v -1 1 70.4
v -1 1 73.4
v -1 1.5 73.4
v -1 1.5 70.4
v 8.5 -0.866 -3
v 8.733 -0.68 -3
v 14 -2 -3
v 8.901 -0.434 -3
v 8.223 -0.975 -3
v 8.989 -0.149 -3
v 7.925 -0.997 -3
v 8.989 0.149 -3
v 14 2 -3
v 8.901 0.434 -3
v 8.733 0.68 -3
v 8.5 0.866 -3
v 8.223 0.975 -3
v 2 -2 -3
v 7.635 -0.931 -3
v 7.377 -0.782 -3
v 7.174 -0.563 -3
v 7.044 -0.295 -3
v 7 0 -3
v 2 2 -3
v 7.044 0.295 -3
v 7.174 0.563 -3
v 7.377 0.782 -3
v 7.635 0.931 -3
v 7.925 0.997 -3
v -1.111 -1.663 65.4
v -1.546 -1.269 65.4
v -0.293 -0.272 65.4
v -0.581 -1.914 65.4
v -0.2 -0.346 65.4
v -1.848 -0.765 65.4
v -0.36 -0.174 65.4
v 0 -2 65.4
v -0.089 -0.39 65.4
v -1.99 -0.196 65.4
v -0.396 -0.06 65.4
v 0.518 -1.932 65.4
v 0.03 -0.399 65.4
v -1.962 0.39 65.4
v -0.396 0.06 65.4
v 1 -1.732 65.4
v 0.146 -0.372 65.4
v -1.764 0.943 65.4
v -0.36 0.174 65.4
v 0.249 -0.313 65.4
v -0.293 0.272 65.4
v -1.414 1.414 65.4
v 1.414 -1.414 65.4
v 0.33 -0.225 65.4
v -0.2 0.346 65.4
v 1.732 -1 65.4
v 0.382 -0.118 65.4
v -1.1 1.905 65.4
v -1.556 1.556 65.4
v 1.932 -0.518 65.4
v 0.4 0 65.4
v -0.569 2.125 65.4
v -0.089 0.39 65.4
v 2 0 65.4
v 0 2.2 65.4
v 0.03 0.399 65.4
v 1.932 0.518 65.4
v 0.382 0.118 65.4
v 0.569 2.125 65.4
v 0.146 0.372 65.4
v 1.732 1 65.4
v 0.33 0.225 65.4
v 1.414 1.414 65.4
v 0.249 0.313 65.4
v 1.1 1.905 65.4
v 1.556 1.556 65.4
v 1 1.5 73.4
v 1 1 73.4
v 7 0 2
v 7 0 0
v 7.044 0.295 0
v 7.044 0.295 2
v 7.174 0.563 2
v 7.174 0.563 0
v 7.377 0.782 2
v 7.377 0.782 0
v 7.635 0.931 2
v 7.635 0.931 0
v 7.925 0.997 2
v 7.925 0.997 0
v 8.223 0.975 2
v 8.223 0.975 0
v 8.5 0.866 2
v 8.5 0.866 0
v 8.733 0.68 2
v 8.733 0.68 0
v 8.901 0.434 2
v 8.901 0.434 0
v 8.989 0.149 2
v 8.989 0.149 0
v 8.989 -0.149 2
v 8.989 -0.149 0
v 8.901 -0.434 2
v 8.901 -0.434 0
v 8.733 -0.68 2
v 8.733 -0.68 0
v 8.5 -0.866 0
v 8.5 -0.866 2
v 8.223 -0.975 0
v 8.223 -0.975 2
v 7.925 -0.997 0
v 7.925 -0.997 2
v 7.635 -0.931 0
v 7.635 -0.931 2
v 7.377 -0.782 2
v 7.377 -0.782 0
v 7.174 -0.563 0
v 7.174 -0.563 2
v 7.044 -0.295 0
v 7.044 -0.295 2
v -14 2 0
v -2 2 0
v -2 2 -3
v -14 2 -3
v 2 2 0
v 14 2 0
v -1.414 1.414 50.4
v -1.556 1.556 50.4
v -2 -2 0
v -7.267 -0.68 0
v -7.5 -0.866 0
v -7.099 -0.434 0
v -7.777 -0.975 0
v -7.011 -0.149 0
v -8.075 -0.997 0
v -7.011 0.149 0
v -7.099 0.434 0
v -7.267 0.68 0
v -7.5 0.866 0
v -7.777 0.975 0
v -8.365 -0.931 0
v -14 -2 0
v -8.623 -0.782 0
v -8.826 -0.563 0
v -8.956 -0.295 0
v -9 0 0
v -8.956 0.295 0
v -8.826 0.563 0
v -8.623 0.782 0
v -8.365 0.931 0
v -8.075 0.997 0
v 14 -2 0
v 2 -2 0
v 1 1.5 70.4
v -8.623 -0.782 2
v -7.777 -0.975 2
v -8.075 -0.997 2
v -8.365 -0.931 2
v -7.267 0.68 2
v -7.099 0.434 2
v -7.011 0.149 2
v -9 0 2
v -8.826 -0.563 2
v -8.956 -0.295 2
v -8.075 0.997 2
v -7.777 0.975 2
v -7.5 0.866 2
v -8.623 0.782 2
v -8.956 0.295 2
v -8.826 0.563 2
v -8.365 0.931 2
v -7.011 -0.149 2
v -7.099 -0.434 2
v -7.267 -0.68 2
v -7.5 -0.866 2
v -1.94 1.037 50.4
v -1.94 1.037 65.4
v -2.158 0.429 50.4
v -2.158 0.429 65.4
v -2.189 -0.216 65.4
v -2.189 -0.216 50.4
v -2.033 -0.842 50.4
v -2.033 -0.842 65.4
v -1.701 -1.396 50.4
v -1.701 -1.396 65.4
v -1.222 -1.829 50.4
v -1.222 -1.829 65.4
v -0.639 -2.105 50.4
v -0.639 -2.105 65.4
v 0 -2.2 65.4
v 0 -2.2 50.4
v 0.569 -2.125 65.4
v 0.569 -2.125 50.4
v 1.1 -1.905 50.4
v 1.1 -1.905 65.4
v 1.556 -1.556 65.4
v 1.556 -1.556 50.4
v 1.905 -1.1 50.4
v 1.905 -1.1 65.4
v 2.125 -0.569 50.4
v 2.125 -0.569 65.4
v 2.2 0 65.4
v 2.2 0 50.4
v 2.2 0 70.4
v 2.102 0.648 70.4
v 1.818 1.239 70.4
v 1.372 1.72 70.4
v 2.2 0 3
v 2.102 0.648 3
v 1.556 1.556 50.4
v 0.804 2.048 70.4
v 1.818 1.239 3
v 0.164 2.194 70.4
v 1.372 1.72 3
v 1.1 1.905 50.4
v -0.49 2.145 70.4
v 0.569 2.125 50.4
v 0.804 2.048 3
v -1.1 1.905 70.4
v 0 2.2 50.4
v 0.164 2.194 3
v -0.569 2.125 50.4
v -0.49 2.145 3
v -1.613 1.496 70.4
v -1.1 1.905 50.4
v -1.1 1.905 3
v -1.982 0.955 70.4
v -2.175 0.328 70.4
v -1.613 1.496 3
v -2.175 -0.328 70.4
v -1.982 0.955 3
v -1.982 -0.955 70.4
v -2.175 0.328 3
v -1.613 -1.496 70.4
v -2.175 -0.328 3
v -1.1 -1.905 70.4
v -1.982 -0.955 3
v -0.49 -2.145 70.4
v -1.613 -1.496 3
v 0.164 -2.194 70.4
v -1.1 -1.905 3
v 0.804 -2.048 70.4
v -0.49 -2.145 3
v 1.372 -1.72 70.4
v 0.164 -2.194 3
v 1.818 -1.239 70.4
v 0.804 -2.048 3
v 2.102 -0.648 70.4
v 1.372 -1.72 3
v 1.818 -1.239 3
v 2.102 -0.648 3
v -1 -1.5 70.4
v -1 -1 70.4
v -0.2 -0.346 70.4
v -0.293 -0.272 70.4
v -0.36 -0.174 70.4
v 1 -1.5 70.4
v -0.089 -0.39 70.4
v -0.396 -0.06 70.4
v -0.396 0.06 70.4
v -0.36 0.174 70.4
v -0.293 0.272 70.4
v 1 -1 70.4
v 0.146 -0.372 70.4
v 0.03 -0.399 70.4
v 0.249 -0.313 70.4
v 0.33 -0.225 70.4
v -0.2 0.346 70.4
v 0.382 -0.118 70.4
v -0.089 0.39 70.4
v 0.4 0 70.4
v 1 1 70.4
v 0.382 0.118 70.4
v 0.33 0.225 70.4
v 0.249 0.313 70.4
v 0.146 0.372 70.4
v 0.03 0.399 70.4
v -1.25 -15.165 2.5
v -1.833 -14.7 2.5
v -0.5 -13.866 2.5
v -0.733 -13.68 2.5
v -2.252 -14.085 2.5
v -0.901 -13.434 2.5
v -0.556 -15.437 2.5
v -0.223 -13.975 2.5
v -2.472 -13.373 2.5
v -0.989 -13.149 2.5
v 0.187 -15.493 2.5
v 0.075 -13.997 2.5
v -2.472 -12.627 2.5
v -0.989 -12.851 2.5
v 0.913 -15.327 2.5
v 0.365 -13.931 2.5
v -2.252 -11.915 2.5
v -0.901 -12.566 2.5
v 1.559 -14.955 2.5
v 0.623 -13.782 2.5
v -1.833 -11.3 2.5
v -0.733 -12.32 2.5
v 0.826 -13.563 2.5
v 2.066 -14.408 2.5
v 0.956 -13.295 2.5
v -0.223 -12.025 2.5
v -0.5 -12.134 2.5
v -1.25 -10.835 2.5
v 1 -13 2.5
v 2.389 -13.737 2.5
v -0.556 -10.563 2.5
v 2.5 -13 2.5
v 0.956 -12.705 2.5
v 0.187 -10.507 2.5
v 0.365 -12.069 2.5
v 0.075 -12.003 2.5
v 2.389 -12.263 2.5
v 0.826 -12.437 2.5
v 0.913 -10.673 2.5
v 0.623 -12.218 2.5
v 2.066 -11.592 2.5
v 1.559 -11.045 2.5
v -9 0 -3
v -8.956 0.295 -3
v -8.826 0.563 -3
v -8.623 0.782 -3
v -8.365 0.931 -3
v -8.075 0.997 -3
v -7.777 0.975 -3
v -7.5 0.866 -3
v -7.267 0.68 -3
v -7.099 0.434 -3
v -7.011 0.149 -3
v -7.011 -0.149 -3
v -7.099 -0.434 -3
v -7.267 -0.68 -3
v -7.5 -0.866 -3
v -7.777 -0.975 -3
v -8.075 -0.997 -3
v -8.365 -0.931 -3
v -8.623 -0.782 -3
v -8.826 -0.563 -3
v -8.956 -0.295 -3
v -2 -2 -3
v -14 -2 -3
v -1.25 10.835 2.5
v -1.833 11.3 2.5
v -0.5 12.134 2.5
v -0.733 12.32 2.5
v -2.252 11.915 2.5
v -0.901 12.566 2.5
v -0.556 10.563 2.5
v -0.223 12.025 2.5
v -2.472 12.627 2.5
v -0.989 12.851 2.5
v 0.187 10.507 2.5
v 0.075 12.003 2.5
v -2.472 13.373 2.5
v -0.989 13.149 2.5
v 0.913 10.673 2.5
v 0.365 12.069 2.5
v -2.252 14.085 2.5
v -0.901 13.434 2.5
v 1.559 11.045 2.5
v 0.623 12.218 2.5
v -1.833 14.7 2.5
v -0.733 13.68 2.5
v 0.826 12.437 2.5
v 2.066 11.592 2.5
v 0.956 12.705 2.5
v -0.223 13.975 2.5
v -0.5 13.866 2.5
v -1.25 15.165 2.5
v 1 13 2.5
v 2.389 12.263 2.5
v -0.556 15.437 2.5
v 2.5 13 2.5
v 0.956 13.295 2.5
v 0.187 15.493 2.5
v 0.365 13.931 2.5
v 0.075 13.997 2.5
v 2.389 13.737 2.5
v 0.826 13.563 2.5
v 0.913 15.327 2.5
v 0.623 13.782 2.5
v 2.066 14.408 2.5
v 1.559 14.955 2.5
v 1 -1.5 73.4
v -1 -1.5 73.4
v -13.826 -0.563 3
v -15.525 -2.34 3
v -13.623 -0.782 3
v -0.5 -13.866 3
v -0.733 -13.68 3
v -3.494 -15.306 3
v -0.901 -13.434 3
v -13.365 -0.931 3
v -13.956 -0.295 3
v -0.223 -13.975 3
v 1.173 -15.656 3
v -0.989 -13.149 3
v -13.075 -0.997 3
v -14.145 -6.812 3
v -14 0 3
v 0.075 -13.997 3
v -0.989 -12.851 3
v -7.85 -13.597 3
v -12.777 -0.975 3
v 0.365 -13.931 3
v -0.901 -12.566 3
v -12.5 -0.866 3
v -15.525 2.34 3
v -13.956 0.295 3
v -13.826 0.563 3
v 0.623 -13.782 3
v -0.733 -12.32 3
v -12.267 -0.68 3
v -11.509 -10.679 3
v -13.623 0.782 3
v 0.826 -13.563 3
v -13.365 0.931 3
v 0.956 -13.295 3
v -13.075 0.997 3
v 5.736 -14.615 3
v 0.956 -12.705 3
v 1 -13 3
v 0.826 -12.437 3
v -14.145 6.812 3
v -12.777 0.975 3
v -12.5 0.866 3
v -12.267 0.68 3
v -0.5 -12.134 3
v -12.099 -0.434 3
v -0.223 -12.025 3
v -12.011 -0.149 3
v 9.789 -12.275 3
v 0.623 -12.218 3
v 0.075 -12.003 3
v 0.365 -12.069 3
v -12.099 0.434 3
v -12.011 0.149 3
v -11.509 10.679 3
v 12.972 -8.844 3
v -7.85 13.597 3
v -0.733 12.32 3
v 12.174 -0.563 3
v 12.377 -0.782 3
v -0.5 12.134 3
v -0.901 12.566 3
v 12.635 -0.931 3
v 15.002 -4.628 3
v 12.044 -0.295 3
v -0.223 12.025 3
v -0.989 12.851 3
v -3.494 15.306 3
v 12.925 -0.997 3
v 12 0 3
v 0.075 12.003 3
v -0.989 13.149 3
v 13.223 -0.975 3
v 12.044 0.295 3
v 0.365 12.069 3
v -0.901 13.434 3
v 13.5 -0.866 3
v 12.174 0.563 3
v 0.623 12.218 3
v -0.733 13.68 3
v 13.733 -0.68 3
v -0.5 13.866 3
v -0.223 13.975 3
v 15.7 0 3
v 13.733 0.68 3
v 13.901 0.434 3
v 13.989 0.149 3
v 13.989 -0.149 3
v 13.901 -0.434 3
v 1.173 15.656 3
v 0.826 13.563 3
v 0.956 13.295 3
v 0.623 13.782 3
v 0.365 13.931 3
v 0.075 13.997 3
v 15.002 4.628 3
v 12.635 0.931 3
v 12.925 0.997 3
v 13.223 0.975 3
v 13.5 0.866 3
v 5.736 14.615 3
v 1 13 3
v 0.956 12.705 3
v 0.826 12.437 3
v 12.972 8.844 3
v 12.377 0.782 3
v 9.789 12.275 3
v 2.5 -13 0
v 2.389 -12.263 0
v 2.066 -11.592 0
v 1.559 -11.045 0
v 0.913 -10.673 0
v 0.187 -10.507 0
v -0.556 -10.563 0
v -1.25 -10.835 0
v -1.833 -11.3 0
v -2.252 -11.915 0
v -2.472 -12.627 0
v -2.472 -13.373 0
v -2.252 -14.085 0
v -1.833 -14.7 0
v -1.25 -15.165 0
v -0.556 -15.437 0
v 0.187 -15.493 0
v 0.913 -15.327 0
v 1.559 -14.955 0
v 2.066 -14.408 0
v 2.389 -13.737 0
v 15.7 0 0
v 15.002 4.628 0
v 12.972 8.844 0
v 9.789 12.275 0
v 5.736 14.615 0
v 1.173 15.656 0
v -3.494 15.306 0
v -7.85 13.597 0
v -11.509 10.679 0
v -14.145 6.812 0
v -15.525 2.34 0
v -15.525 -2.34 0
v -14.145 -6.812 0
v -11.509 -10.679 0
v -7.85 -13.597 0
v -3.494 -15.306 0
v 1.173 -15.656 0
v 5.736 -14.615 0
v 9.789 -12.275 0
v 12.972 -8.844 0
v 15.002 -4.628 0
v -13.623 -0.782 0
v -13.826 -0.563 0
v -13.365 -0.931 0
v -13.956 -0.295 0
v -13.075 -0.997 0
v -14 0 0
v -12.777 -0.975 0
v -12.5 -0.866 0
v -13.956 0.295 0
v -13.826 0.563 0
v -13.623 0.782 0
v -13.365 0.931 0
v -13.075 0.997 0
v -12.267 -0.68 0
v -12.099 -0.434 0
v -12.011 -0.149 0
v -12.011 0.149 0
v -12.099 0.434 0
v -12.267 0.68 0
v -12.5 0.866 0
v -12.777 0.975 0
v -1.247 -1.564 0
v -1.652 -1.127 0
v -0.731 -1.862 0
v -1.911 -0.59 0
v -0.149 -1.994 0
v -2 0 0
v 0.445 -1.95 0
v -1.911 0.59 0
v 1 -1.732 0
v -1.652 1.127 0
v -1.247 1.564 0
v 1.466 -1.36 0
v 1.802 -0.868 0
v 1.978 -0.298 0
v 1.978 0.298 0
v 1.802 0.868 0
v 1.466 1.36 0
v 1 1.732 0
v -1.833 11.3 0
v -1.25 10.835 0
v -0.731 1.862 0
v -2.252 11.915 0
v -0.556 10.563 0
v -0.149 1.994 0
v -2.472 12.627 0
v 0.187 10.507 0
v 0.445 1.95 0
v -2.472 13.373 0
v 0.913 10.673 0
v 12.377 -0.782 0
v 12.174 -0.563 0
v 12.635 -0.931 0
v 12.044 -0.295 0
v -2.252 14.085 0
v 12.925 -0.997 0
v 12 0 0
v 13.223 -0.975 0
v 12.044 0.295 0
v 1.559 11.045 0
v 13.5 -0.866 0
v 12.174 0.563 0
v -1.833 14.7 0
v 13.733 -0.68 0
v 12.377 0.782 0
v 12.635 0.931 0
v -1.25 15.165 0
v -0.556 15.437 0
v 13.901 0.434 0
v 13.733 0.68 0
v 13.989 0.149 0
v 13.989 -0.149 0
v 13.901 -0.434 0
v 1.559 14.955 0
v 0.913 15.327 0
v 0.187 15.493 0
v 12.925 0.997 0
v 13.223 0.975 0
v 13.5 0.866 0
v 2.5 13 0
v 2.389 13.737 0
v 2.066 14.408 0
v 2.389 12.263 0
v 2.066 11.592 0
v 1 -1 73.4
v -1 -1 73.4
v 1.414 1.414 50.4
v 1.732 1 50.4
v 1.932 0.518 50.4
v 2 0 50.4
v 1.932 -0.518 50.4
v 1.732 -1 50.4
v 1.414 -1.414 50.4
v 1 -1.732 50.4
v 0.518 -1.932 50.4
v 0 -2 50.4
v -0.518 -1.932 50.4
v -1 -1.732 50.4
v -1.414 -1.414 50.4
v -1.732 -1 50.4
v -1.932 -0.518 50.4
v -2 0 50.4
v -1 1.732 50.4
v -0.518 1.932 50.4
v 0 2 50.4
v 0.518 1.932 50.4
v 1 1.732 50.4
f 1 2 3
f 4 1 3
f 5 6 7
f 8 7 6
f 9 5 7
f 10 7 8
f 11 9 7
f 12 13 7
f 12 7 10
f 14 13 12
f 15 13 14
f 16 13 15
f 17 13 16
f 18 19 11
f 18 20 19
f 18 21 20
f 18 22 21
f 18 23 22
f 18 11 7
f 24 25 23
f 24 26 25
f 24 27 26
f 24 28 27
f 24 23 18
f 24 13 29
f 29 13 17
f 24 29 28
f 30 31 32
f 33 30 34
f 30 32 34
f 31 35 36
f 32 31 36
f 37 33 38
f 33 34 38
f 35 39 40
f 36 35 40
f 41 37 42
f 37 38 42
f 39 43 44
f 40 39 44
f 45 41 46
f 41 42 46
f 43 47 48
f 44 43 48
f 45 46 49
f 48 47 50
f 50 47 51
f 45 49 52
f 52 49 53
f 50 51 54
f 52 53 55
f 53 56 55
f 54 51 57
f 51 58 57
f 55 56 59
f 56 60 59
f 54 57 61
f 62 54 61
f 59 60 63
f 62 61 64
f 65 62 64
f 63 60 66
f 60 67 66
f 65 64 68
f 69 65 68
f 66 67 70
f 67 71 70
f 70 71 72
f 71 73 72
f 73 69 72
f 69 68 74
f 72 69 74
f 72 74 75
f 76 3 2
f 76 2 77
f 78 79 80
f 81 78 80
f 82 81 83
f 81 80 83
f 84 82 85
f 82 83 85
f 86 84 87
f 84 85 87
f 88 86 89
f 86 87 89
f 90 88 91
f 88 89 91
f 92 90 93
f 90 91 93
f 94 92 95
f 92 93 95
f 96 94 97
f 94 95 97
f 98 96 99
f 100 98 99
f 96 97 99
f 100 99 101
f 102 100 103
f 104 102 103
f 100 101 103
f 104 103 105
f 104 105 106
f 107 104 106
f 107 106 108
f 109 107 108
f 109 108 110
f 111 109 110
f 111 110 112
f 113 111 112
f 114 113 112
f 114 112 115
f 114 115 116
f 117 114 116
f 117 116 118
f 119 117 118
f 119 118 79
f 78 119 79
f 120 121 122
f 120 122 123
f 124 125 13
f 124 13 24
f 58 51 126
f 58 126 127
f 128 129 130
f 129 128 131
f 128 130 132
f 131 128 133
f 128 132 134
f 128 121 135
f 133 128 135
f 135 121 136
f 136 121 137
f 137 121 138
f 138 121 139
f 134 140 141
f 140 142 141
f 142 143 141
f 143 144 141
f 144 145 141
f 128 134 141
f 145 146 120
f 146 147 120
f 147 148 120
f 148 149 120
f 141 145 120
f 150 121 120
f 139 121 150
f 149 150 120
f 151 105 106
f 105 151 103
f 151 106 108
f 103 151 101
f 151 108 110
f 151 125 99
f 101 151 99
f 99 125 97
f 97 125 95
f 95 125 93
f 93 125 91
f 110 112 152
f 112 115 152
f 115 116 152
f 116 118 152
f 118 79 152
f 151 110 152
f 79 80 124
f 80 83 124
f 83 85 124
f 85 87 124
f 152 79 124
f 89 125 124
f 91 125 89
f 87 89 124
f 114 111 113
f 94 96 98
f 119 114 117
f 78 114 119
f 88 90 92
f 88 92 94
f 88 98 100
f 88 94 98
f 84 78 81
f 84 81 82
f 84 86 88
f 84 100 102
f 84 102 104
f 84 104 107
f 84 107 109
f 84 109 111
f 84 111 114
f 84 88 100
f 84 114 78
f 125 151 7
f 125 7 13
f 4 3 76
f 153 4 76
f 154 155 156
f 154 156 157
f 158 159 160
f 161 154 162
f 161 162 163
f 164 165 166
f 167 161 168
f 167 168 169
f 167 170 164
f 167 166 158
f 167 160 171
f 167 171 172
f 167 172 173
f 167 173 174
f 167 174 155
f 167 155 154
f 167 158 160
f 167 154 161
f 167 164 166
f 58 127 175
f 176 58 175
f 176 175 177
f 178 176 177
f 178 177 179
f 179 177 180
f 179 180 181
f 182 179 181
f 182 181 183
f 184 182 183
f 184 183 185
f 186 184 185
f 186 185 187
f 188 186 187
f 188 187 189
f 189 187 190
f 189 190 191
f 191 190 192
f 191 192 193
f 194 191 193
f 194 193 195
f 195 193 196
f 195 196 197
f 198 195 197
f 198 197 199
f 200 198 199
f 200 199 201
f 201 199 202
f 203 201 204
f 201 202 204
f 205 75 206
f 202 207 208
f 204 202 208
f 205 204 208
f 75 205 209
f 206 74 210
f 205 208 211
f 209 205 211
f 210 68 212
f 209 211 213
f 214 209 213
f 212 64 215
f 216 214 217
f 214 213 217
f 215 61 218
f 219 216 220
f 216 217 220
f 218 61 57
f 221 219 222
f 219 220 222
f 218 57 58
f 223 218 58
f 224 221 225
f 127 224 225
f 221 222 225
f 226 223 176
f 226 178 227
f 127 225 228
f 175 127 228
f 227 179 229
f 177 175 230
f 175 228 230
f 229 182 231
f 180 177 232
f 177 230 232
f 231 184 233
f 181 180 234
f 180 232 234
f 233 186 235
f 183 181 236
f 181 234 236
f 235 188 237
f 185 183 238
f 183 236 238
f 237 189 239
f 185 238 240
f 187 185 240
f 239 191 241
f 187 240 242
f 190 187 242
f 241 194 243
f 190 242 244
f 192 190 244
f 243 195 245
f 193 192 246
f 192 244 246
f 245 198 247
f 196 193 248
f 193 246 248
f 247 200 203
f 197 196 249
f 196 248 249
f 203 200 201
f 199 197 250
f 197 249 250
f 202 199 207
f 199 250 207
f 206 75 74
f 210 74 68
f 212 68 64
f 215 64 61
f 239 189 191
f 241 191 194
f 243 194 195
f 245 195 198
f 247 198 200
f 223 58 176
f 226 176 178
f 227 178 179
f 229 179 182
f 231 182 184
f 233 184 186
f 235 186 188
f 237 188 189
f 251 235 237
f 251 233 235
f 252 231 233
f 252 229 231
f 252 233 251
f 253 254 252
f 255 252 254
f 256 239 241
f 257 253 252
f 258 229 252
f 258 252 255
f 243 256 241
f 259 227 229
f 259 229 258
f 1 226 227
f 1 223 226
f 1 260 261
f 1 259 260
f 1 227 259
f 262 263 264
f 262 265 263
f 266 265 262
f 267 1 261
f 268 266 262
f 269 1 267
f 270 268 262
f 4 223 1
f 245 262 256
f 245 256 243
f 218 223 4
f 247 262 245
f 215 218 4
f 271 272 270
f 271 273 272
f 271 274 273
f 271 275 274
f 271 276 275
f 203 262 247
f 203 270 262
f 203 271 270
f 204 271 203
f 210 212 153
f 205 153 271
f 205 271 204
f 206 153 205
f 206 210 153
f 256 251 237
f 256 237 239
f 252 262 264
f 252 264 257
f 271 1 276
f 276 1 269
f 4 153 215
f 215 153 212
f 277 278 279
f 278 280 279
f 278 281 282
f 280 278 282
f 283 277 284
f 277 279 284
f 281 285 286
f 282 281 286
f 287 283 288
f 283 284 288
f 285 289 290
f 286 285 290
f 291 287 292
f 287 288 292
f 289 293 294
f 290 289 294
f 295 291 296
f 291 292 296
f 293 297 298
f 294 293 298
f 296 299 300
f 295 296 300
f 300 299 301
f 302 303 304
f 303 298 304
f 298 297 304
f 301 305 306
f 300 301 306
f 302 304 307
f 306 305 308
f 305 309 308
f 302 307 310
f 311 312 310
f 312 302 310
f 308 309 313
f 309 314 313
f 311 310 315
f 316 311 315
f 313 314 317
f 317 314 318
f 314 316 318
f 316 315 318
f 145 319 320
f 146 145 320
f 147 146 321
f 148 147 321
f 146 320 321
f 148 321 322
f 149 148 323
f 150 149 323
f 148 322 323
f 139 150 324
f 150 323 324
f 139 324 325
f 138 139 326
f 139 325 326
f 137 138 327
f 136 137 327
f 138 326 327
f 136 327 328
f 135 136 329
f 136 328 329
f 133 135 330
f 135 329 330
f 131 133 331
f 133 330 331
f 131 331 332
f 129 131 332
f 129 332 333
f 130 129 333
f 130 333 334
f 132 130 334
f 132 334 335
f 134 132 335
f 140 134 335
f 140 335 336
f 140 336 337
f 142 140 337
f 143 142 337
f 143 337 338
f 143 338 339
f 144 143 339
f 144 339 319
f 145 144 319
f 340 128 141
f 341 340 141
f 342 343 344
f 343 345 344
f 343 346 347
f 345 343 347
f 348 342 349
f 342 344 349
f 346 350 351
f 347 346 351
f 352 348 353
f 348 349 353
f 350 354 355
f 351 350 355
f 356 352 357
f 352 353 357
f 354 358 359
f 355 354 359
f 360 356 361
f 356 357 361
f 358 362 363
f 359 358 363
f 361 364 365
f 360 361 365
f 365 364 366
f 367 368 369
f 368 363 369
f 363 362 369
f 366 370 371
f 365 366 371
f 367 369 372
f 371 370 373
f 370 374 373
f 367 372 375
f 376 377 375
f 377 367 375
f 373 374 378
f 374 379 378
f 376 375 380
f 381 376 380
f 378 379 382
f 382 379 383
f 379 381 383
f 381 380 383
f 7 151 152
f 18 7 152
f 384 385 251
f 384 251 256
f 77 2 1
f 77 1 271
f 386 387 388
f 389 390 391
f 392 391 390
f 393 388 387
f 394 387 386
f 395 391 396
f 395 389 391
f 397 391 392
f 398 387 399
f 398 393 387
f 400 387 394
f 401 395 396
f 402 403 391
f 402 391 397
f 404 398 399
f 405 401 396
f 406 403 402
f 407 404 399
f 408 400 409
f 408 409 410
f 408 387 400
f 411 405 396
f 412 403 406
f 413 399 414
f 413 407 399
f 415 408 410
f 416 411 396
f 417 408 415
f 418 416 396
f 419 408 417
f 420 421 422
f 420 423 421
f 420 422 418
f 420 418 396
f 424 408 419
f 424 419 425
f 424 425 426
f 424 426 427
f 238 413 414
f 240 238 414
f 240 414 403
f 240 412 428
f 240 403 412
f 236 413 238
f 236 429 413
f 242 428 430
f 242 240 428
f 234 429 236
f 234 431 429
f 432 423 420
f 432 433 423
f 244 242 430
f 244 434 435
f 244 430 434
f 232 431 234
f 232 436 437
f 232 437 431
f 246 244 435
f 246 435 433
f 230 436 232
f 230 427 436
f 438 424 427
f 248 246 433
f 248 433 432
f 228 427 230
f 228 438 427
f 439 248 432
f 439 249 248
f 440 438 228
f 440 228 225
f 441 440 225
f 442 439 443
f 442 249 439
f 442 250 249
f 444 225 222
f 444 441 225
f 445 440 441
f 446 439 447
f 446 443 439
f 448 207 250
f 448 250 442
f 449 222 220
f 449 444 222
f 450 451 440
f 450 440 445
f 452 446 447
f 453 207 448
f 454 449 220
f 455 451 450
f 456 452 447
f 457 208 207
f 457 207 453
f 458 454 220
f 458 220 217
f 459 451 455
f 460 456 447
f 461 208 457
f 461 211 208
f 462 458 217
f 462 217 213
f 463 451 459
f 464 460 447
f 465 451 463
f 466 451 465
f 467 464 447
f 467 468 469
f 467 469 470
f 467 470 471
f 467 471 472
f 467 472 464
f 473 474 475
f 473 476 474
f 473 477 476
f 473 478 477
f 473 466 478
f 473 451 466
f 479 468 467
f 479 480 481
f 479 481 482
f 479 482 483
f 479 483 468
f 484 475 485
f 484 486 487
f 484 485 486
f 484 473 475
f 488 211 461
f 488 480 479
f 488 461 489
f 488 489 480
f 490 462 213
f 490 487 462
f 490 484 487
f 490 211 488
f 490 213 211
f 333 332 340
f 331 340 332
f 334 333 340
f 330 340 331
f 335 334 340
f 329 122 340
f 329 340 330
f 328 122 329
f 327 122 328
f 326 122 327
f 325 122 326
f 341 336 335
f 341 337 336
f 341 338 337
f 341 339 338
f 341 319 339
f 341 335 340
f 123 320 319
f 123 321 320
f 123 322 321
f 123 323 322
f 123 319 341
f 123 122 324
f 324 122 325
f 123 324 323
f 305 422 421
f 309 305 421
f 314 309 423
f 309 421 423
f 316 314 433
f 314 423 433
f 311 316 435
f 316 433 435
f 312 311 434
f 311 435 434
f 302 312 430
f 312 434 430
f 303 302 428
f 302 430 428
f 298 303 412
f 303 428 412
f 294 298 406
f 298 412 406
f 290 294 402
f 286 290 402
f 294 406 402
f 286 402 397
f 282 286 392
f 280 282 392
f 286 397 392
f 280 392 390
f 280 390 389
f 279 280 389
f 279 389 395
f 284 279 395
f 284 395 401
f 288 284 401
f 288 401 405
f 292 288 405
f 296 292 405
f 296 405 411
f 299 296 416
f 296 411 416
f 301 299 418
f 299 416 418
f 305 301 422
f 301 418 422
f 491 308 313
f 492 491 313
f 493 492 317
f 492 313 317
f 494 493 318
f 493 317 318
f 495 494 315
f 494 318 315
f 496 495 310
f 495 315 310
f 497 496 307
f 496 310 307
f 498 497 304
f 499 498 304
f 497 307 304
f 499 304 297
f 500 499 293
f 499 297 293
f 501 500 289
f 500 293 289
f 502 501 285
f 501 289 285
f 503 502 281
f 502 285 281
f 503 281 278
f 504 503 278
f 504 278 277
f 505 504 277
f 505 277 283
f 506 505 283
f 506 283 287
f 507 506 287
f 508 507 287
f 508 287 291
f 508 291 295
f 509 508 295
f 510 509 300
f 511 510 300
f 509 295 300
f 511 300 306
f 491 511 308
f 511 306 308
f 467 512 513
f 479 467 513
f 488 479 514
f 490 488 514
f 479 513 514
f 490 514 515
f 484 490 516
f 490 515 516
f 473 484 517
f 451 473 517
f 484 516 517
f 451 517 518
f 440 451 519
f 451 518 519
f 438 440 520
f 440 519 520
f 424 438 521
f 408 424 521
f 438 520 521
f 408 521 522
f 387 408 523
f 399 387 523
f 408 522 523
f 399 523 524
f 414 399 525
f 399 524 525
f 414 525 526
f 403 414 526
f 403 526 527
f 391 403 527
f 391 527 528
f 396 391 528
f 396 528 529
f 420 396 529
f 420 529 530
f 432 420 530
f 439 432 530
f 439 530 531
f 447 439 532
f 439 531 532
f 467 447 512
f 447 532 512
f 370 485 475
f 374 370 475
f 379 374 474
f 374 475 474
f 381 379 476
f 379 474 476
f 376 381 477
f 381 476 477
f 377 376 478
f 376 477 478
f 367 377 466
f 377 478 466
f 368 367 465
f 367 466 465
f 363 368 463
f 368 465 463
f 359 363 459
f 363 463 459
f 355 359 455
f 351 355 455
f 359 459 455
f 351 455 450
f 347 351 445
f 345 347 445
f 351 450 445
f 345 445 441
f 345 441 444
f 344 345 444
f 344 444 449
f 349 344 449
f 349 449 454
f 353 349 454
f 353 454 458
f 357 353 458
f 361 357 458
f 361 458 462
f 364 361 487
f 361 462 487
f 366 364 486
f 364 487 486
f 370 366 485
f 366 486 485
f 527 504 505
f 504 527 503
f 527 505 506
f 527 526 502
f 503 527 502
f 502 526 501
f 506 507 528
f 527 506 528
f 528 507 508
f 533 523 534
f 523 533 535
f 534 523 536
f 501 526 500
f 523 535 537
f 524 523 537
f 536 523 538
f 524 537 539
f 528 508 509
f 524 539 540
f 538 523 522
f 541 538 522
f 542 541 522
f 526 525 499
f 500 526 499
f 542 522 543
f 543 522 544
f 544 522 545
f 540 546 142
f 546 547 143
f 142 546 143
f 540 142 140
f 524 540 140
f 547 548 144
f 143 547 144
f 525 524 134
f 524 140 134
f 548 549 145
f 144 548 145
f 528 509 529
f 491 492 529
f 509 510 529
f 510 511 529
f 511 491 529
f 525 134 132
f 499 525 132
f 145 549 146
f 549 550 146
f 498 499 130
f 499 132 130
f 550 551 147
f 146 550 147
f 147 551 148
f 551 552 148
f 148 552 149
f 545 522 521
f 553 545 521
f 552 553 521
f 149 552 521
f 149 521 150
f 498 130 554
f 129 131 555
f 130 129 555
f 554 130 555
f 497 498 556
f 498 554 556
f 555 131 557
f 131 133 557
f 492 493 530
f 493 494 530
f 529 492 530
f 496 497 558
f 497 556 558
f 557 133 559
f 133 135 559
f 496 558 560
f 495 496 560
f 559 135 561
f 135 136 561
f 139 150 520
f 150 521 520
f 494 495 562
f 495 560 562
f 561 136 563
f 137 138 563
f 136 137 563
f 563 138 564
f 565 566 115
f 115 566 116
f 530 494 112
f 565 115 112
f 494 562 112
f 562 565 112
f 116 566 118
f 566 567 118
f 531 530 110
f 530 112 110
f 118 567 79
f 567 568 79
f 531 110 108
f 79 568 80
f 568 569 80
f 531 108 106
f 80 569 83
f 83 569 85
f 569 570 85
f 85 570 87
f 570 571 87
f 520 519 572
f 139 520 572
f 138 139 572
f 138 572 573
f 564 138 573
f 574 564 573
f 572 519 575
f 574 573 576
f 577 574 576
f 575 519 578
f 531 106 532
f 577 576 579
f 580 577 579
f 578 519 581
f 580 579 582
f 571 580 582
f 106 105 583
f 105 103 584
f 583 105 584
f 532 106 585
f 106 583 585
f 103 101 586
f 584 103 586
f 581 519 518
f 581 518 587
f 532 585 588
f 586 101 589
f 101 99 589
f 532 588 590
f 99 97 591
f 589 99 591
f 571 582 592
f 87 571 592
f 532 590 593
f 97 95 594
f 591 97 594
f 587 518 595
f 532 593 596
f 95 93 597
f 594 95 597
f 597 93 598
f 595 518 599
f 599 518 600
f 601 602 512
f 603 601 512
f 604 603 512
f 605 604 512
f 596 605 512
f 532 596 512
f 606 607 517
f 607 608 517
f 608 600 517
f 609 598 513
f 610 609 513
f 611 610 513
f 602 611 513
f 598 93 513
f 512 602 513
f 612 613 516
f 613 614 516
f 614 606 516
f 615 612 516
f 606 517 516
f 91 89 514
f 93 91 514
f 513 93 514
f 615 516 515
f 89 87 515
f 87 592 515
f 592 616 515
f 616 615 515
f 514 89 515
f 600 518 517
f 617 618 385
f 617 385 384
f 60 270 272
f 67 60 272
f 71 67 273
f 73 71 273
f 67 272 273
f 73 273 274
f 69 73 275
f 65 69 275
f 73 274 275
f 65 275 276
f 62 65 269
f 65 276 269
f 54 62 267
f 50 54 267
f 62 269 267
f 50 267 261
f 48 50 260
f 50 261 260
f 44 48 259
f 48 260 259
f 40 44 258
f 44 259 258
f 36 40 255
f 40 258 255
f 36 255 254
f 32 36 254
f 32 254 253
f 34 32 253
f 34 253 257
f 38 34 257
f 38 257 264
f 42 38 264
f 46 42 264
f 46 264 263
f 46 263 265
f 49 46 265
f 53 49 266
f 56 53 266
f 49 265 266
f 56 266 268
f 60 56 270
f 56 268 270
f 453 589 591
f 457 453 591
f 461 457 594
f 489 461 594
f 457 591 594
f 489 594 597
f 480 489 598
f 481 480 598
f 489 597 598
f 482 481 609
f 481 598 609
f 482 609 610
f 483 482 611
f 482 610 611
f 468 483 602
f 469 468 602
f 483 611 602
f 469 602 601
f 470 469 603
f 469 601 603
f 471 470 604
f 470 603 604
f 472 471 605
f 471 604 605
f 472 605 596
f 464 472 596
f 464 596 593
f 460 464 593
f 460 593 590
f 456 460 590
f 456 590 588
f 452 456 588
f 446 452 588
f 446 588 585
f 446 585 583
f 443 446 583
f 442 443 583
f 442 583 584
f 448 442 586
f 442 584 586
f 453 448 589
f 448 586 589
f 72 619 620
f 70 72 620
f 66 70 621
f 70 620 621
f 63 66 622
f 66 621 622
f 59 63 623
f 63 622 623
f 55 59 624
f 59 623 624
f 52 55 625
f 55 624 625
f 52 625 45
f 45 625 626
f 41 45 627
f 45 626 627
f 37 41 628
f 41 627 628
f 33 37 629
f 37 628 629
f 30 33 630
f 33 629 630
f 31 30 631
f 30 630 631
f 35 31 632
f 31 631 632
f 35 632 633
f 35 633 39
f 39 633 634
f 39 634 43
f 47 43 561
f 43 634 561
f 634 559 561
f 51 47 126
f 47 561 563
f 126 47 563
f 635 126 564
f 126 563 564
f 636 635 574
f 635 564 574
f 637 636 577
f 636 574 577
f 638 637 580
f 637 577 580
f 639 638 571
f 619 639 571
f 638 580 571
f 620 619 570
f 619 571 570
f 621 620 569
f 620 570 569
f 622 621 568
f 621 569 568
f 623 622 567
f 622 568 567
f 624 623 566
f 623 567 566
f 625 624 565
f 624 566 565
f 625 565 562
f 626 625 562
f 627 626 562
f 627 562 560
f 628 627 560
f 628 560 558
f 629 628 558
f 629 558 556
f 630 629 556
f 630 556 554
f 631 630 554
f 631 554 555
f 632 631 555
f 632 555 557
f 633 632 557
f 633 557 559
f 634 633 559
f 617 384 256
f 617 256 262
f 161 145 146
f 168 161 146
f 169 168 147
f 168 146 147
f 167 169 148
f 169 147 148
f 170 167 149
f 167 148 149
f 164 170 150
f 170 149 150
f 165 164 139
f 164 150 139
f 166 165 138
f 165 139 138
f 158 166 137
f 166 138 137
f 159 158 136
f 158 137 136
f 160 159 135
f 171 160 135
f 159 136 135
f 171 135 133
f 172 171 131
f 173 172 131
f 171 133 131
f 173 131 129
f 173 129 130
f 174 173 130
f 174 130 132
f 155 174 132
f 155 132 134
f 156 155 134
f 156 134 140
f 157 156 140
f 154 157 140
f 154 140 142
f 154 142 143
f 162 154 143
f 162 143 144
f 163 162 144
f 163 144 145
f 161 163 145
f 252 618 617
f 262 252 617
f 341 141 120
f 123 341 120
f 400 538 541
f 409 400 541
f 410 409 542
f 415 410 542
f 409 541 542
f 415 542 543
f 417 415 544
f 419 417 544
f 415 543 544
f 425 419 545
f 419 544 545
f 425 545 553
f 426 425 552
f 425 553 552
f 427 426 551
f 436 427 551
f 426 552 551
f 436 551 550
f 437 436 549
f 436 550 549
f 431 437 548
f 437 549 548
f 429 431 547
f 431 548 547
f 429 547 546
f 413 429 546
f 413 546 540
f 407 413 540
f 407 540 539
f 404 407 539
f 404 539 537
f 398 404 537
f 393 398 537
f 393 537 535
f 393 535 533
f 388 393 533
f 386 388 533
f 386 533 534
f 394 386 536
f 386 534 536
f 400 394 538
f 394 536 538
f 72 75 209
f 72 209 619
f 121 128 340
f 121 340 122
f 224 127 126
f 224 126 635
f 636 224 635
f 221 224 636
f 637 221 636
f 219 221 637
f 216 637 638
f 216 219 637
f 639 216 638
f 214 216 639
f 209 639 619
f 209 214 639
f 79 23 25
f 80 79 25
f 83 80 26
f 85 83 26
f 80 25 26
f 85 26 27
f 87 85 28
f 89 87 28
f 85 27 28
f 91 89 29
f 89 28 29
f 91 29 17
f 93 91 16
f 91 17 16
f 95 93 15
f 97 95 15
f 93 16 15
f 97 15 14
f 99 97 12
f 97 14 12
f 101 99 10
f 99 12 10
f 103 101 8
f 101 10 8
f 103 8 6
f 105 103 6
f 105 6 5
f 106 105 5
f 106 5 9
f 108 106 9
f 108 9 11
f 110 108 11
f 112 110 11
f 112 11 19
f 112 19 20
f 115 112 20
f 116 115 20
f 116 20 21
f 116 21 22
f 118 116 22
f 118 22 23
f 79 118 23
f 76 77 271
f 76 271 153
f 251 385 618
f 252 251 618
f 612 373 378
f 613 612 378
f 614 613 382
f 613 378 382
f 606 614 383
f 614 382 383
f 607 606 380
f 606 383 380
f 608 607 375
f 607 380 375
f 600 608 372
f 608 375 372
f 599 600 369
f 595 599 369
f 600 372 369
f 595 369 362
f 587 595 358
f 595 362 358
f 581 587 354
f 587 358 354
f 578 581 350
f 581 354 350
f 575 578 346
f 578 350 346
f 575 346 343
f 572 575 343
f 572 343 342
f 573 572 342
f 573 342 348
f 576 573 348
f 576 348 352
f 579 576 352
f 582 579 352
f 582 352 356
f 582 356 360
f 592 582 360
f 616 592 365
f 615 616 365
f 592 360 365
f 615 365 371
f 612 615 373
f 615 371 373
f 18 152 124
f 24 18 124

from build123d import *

# Parameters (mm, degrees)
SKETCH_1_R            = 15.7
EXTRUDE_1_DEPTH       = 3
SKETCH_5_R            = 1
CUT_EXTRUDE_3_DEPTH   = 3
SKETCH_6_R            = 1
CUT_EXTRUDE_4_DEPTH   = 3
SKETCH_7_R            = 2
CUT_EXTRUDE_5_DEPTH   = 3
SKETCH_10_W           = 12
SKETCH_10_H           = 4
EXTRUDE_8_DEPTH       = 3
SKETCH_11_W           = 12
SKETCH_11_H           = 4
EXTRUDE_9_DEPTH       = 3
SKETCH_12_R           = 2.2
EXTRUDE_11_DEPTH      = 47.4
SKETCH_16_R           = 2
CUT_EXTRUDE_6_DEPTH   = 47.4
EXTRUDE_13_DEPTH      = 15
SKETCH_20_R           = 2.2
EXTRUDE_15_DEPTH      = 8
SKETCH_22_OUTSIDE_W   = 51.074
SKETCH_22_OUTSIDE_H   = 51.074
SKETCH_22_OUTSIDE_W_2 = 2
SKETCH_22_OUTSIDE_H_2 = 0.5
CUT_EXTRUDE_7_DEPTH   = 3
SKETCH_24_R           = 0.4
CUT_EXTRUDE_9_DEPTH   = 5
SKETCH_25_R           = 1
CUT_EXTRUDE_10_DEPTH  = 0.5
SKETCH_26_R           = 2.5
CUT_EXTRUDE_12_DEPTH  = 2.5
SKETCH_27_R           = 1
CUT_EXTRUDE_13_DEPTH  = 5


with BuildPart() as part:
    # 草图1 → 凸台-拉伸1 (new body)
    with BuildSketch(Plane.XY):
        Circle(SKETCH_1_R)
    extrude(amount=EXTRUDE_1_DEPTH)

    # 草图5 → 切除-拉伸3 (cut)
    with BuildSketch(Plane(origin=(0, 0, 0), x_dir=(-1, 0, 0), z_dir=(0, 0, -1))):
        with Locations((13, 0)):
            Circle(SKETCH_5_R)
    extrude(amount=-CUT_EXTRUDE_3_DEPTH, mode=Mode.SUBTRACT)

    # 草图6 → 切除-拉伸4 (cut)
    with BuildSketch(Plane(origin=(0, 0, 0), x_dir=(-1, 0, 0), z_dir=(0, 0, -1))):
        with Locations((-13, 0)):
            Circle(SKETCH_6_R)
    extrude(amount=-CUT_EXTRUDE_4_DEPTH, mode=Mode.SUBTRACT)

    # 草图7 → 切除-拉伸5 (cut)
    with BuildSketch(Plane(origin=(0, 0, 0), x_dir=(-1, 0, 0), z_dir=(0, 0, -1))):
        Circle(SKETCH_7_R)
    extrude(amount=-CUT_EXTRUDE_5_DEPTH, mode=Mode.SUBTRACT)

    # 草图12 → 凸台-拉伸11 (add)
    with BuildSketch(Plane.XY.offset(3)):
        Circle(SKETCH_12_R)
    extrude(amount=EXTRUDE_11_DEPTH)

    # 草图16 → 切除-拉伸6 (cut)
    with BuildSketch(Plane(origin=(0, 0, 3), x_dir=(-1, 0, 0), z_dir=(0, 0, -1))):
        Circle(SKETCH_16_R)
    extrude(amount=-CUT_EXTRUDE_6_DEPTH, mode=Mode.SUBTRACT)

    # 草图19 → 凸台-拉伸13 (add)
    with BuildSketch(Plane.XY.offset(50.4)):
        with BuildLine():
            ThreePointArc((0, -2), (-1.847759065, -0.765366865), (-1.414213562, 1.414213562))
            Line((-1.414213562, 1.414213562), (-1.555634919, 1.555634919))
            ThreePointArc((-1.555634919, 1.555634919), (-2.032534972, -0.841903551), (0, -2.2))
            Line((0, -2.2), (0, -2))
        make_face()
        with BuildLine():
            Line((1.555634919, 1.555634919), (1.414213562, 1.414213562))
            ThreePointArc((1.414213562, 1.414213562), (1.847759065, 0.765366865), (2, 0))
            ThreePointArc((2, 0), (1.414213562, -1.414213562), (0, -2))
            Line((0, -2), (0, -2.2))
            ThreePointArc((0, -2.2), (1.555634919, -1.555634919), (2.2, 0))
            ThreePointArc((2.2, 0), (2.032534972, 0.841903551), (1.555634919, 1.555634919))
        make_face()
    extrude(amount=EXTRUDE_13_DEPTH)

    # 草图20 → 凸台-拉伸15 (add)
    with BuildSketch(Plane.XY.offset(65.4)):
        Circle(SKETCH_20_R)
    extrude(amount=EXTRUDE_15_DEPTH)

    # 草图22 outside → 切除-拉伸7 (cut)
    with BuildSketch(Plane.XY.offset(73.4)):
        Rectangle(SKETCH_22_OUTSIDE_W, SKETCH_22_OUTSIDE_H)
        with Locations((0, 1.25)):
            Rectangle(SKETCH_22_OUTSIDE_W_2, SKETCH_22_OUTSIDE_H_2, mode=Mode.SUBTRACT)
        with Locations((0, -1.25)):
            Rectangle(SKETCH_22_OUTSIDE_W_2, SKETCH_22_OUTSIDE_H_2, mode=Mode.SUBTRACT)
    extrude(amount=-CUT_EXTRUDE_7_DEPTH, mode=Mode.SUBTRACT)

    # 草图24 → 切除-拉伸9 (cut)
    with BuildSketch(Plane.XY.offset(70.4)):
        Circle(SKETCH_24_R)
    extrude(amount=-CUT_EXTRUDE_9_DEPTH, mode=Mode.SUBTRACT)

    # 草图25 → 切除-拉伸10 (cut)
    with BuildSketch(Plane.XY.offset(3)):
        with Locations((0, 13)):
            Circle(SKETCH_25_R)
        with Locations((0, -13)):
            Circle(SKETCH_25_R)
    extrude(amount=-CUT_EXTRUDE_10_DEPTH, mode=Mode.SUBTRACT)

    # 草图26 → 切除-拉伸12 (cut)
    with BuildSketch(Plane.XY.offset(2.5)):
        with Locations((0, 13)):
            Circle(SKETCH_26_R)
        with Locations((0, -13)):
            Circle(SKETCH_26_R)
    extrude(amount=-CUT_EXTRUDE_12_DEPTH, mode=Mode.SUBTRACT)


with BuildPart() as body_2:
    # 草图10 → 凸台-拉伸8 (new body)
    with BuildSketch(Plane(origin=(0, 0, 0), x_dir=(-1, 0, 0), z_dir=(0, 0, -1))):
        with Locations((-8, 0)):
            Rectangle(SKETCH_10_W, SKETCH_10_H)
    extrude(amount=EXTRUDE_8_DEPTH)


with BuildPart() as body_3:
    # 草图11 → 凸台-拉伸9 (new body)
    with BuildSketch(Plane(origin=(0, 0, 0), x_dir=(-1, 0, 0), z_dir=(0, 0, -1))):
        with Locations((8, 0)):
            Rectangle(SKETCH_11_W, SKETCH_11_H)
    extrude(amount=EXTRUDE_9_DEPTH)


with BuildPart() as cut_extrude_13_tool:
    # 草图27 → 切除-拉伸13 (new body)
    with BuildSketch(Plane(origin=(0, 0, -3), x_dir=(-1, 0, 0), z_dir=(0, 0, -1))):
        with Locations((8, 0)):
            Circle(SKETCH_27_R)
        with Locations((-8, 0)):
            Circle(SKETCH_27_R)
    extrude(amount=-CUT_EXTRUDE_13_DEPTH)


with BuildPart() as part_1:
    add(part.part)

    # 切除-拉伸13: cut by cut_extrude_13_tool
    add(cut_extrude_13_tool.part, mode=Mode.SUBTRACT)


with BuildPart() as body_2_1:
    add(body_2.part)

    # 切除-拉伸13: cut by cut_extrude_13_tool
    add(cut_extrude_13_tool.part, mode=Mode.SUBTRACT)


with BuildPart() as body_3_1:
    add(body_3.part)

    # 切除-拉伸13: cut by cut_extrude_13_tool
    add(cut_extrude_13_tool.part, mode=Mode.SUBTRACT)


solid = Compound([part_1.part, body_2_1.part, body_3_1.part])
